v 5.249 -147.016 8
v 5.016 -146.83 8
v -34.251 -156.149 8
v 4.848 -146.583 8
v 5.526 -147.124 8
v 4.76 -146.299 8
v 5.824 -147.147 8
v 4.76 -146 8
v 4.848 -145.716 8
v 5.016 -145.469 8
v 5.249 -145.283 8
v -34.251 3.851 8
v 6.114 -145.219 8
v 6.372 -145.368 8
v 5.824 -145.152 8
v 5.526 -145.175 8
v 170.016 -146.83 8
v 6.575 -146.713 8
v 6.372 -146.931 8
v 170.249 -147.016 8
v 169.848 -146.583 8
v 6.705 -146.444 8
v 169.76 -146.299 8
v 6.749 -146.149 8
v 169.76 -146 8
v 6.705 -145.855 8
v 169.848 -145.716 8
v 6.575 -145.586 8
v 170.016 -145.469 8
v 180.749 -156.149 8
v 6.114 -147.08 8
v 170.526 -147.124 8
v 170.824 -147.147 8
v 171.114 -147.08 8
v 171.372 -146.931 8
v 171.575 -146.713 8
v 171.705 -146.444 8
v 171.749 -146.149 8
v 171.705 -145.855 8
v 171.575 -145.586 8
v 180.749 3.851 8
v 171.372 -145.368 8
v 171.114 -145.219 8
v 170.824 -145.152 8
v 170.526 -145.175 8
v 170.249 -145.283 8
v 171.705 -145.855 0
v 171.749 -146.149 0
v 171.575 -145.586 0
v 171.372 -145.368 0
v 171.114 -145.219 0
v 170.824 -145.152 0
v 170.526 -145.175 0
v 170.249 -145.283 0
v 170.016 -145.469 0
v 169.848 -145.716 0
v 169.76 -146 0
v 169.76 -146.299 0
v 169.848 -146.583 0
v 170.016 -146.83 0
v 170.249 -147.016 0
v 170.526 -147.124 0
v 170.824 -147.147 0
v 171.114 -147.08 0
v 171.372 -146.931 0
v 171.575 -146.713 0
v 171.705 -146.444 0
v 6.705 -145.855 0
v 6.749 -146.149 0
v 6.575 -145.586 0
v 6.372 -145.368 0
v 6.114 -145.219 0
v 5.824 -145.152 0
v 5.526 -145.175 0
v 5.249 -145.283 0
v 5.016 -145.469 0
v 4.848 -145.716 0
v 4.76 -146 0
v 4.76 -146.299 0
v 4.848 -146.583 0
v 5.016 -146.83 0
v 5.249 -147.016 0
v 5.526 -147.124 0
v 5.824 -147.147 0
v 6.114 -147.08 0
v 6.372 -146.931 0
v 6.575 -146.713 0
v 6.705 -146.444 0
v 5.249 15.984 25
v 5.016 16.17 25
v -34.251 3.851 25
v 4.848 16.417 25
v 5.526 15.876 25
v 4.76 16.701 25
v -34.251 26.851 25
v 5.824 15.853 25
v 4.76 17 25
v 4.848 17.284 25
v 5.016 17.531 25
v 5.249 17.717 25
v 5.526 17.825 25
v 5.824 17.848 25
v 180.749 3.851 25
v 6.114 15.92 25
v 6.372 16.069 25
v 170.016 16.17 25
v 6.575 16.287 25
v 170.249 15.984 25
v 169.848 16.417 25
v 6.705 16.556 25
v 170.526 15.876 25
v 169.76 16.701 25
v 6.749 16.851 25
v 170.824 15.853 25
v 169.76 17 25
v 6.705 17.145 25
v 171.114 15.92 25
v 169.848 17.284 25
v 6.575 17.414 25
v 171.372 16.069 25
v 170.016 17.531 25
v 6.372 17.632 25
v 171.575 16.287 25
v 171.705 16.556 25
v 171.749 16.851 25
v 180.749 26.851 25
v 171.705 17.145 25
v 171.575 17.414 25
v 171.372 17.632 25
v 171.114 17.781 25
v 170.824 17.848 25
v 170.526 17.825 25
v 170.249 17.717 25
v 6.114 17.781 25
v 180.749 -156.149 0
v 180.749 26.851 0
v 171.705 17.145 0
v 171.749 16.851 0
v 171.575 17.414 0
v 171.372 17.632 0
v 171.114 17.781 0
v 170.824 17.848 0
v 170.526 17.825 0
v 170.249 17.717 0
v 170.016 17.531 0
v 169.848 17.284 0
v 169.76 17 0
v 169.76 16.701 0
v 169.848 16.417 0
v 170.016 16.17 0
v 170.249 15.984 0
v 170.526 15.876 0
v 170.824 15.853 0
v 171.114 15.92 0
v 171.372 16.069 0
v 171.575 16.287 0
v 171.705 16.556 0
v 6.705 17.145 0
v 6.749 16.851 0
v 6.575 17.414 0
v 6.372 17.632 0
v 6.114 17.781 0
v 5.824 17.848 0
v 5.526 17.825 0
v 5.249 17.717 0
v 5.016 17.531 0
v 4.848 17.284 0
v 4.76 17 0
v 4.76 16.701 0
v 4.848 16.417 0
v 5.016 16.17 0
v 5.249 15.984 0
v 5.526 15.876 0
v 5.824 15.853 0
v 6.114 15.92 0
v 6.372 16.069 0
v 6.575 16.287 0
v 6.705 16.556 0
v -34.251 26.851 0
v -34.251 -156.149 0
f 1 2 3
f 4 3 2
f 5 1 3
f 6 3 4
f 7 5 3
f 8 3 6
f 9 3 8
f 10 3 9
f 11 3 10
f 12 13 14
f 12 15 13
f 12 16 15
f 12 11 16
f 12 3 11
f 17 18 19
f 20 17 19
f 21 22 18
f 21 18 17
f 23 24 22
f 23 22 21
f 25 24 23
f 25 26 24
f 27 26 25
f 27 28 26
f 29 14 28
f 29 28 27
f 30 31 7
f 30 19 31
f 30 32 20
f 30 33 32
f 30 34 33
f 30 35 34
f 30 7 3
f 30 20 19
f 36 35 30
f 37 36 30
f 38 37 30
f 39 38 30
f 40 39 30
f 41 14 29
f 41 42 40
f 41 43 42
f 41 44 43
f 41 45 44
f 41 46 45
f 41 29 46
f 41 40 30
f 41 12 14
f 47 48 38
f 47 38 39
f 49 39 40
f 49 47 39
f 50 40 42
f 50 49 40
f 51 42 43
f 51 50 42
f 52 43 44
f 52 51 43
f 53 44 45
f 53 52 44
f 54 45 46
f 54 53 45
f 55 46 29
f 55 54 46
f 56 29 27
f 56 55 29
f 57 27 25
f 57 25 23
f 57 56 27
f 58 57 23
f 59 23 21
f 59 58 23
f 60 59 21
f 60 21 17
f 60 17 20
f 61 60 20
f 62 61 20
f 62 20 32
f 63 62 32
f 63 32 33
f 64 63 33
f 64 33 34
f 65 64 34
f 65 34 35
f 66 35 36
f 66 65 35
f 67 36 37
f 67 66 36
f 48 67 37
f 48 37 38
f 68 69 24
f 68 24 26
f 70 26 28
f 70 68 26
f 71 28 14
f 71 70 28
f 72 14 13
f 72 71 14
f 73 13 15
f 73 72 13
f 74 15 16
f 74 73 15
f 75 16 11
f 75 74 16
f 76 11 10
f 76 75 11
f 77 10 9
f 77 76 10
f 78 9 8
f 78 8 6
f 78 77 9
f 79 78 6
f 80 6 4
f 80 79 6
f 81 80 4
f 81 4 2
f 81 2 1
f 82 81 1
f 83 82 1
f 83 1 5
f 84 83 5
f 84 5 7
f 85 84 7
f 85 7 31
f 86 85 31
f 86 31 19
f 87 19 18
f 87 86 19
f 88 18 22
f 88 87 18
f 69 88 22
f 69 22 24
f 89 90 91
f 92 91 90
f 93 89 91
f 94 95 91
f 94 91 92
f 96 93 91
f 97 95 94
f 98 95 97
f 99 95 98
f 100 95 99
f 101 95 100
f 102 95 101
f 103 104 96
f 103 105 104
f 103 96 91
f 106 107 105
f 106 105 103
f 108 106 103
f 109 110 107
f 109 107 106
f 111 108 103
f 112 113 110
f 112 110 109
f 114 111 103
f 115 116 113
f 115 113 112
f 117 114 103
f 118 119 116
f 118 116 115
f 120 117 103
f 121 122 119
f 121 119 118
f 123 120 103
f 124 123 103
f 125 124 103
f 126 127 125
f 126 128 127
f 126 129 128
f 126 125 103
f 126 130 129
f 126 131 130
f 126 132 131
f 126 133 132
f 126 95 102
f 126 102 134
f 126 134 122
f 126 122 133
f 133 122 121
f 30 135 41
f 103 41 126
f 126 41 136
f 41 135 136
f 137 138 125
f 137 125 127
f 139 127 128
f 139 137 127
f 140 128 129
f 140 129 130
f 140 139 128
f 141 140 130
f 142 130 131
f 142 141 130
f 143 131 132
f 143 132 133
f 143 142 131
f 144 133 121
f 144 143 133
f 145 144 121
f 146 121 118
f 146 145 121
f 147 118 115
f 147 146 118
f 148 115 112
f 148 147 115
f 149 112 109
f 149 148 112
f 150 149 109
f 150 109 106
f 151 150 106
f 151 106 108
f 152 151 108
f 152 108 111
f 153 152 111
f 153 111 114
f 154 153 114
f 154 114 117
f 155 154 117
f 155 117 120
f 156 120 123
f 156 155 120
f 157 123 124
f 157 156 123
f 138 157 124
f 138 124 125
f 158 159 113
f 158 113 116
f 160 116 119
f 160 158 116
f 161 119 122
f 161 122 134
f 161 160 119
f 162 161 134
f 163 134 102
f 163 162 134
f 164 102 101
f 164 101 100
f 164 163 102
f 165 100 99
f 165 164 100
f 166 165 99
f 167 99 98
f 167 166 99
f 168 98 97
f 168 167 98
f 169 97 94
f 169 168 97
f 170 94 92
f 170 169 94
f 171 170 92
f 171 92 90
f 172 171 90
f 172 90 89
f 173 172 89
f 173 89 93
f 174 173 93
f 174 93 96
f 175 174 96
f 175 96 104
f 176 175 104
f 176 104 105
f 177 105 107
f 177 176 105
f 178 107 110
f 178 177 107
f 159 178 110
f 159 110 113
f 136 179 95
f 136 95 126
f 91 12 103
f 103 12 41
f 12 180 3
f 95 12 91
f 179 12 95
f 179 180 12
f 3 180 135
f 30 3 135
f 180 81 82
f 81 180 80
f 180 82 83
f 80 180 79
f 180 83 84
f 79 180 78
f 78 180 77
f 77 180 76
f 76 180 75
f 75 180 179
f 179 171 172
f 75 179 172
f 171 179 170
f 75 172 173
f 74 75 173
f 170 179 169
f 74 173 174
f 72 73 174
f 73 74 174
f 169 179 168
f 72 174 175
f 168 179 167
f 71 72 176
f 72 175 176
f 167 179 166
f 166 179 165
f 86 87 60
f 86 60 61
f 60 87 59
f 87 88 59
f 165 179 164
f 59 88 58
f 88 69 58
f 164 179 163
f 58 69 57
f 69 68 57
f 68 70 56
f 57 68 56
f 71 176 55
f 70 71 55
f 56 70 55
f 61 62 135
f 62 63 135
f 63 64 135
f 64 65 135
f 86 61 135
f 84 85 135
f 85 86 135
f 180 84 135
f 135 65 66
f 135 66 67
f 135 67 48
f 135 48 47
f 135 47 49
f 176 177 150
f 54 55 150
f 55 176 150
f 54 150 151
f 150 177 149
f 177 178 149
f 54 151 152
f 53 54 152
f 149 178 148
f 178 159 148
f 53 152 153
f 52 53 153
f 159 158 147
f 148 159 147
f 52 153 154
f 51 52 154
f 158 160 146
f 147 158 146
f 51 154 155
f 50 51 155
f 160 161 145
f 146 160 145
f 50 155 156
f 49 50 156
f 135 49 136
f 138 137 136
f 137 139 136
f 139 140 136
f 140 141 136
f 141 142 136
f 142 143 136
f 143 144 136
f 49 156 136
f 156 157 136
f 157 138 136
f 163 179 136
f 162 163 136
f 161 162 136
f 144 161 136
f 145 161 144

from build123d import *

# Parameters (mm, degrees)
CROQUIS1_W              = 215
CROQUIS1_H              = 160
CROQUIS1_R              = 1
SALIENTE_EXTRUIR1_DEPTH = 8
CROQUIS1_3_W            = 215
CROQUIS1_3_H            = 23
CROQUIS1_3_R            = 1
SALIENTE_EXTRUIR2_DEPTH = 25


with BuildPart() as part:
    # Croquis1 → Saliente-Extruir1 (new body)
    with BuildSketch(Plane.XY):
        with Locations((73.249006664, -76.149492386)):
            Rectangle(CROQUIS1_W, CROQUIS1_H)
        with Locations((5.749006664, -146.149492386)):
            Circle(CROQUIS1_R, mode=Mode.SUBTRACT)
        with Locations((170.749006664, -146.149492386)):
            Circle(CROQUIS1_R, mode=Mode.SUBTRACT)
    extrude(amount=SALIENTE_EXTRUIR1_DEPTH)

    # Croquis1_3 → Saliente-Extruir2 (add)
    with BuildSketch(Plane.XY):
        with Locations((73.249006664, 15.350507614)):
            Rectangle(CROQUIS1_3_W, CROQUIS1_3_H)
        with Locations((5.749006664, 16.850507614)):
            Circle(CROQUIS1_3_R, mode=Mode.SUBTRACT)
        with Locations((170.749006664, 16.850507614)):
            Circle(CROQUIS1_3_R, mode=Mode.SUBTRACT)
    extrude(amount=SALIENTE_EXTRUIR2_DEPTH)


solid = part.part
